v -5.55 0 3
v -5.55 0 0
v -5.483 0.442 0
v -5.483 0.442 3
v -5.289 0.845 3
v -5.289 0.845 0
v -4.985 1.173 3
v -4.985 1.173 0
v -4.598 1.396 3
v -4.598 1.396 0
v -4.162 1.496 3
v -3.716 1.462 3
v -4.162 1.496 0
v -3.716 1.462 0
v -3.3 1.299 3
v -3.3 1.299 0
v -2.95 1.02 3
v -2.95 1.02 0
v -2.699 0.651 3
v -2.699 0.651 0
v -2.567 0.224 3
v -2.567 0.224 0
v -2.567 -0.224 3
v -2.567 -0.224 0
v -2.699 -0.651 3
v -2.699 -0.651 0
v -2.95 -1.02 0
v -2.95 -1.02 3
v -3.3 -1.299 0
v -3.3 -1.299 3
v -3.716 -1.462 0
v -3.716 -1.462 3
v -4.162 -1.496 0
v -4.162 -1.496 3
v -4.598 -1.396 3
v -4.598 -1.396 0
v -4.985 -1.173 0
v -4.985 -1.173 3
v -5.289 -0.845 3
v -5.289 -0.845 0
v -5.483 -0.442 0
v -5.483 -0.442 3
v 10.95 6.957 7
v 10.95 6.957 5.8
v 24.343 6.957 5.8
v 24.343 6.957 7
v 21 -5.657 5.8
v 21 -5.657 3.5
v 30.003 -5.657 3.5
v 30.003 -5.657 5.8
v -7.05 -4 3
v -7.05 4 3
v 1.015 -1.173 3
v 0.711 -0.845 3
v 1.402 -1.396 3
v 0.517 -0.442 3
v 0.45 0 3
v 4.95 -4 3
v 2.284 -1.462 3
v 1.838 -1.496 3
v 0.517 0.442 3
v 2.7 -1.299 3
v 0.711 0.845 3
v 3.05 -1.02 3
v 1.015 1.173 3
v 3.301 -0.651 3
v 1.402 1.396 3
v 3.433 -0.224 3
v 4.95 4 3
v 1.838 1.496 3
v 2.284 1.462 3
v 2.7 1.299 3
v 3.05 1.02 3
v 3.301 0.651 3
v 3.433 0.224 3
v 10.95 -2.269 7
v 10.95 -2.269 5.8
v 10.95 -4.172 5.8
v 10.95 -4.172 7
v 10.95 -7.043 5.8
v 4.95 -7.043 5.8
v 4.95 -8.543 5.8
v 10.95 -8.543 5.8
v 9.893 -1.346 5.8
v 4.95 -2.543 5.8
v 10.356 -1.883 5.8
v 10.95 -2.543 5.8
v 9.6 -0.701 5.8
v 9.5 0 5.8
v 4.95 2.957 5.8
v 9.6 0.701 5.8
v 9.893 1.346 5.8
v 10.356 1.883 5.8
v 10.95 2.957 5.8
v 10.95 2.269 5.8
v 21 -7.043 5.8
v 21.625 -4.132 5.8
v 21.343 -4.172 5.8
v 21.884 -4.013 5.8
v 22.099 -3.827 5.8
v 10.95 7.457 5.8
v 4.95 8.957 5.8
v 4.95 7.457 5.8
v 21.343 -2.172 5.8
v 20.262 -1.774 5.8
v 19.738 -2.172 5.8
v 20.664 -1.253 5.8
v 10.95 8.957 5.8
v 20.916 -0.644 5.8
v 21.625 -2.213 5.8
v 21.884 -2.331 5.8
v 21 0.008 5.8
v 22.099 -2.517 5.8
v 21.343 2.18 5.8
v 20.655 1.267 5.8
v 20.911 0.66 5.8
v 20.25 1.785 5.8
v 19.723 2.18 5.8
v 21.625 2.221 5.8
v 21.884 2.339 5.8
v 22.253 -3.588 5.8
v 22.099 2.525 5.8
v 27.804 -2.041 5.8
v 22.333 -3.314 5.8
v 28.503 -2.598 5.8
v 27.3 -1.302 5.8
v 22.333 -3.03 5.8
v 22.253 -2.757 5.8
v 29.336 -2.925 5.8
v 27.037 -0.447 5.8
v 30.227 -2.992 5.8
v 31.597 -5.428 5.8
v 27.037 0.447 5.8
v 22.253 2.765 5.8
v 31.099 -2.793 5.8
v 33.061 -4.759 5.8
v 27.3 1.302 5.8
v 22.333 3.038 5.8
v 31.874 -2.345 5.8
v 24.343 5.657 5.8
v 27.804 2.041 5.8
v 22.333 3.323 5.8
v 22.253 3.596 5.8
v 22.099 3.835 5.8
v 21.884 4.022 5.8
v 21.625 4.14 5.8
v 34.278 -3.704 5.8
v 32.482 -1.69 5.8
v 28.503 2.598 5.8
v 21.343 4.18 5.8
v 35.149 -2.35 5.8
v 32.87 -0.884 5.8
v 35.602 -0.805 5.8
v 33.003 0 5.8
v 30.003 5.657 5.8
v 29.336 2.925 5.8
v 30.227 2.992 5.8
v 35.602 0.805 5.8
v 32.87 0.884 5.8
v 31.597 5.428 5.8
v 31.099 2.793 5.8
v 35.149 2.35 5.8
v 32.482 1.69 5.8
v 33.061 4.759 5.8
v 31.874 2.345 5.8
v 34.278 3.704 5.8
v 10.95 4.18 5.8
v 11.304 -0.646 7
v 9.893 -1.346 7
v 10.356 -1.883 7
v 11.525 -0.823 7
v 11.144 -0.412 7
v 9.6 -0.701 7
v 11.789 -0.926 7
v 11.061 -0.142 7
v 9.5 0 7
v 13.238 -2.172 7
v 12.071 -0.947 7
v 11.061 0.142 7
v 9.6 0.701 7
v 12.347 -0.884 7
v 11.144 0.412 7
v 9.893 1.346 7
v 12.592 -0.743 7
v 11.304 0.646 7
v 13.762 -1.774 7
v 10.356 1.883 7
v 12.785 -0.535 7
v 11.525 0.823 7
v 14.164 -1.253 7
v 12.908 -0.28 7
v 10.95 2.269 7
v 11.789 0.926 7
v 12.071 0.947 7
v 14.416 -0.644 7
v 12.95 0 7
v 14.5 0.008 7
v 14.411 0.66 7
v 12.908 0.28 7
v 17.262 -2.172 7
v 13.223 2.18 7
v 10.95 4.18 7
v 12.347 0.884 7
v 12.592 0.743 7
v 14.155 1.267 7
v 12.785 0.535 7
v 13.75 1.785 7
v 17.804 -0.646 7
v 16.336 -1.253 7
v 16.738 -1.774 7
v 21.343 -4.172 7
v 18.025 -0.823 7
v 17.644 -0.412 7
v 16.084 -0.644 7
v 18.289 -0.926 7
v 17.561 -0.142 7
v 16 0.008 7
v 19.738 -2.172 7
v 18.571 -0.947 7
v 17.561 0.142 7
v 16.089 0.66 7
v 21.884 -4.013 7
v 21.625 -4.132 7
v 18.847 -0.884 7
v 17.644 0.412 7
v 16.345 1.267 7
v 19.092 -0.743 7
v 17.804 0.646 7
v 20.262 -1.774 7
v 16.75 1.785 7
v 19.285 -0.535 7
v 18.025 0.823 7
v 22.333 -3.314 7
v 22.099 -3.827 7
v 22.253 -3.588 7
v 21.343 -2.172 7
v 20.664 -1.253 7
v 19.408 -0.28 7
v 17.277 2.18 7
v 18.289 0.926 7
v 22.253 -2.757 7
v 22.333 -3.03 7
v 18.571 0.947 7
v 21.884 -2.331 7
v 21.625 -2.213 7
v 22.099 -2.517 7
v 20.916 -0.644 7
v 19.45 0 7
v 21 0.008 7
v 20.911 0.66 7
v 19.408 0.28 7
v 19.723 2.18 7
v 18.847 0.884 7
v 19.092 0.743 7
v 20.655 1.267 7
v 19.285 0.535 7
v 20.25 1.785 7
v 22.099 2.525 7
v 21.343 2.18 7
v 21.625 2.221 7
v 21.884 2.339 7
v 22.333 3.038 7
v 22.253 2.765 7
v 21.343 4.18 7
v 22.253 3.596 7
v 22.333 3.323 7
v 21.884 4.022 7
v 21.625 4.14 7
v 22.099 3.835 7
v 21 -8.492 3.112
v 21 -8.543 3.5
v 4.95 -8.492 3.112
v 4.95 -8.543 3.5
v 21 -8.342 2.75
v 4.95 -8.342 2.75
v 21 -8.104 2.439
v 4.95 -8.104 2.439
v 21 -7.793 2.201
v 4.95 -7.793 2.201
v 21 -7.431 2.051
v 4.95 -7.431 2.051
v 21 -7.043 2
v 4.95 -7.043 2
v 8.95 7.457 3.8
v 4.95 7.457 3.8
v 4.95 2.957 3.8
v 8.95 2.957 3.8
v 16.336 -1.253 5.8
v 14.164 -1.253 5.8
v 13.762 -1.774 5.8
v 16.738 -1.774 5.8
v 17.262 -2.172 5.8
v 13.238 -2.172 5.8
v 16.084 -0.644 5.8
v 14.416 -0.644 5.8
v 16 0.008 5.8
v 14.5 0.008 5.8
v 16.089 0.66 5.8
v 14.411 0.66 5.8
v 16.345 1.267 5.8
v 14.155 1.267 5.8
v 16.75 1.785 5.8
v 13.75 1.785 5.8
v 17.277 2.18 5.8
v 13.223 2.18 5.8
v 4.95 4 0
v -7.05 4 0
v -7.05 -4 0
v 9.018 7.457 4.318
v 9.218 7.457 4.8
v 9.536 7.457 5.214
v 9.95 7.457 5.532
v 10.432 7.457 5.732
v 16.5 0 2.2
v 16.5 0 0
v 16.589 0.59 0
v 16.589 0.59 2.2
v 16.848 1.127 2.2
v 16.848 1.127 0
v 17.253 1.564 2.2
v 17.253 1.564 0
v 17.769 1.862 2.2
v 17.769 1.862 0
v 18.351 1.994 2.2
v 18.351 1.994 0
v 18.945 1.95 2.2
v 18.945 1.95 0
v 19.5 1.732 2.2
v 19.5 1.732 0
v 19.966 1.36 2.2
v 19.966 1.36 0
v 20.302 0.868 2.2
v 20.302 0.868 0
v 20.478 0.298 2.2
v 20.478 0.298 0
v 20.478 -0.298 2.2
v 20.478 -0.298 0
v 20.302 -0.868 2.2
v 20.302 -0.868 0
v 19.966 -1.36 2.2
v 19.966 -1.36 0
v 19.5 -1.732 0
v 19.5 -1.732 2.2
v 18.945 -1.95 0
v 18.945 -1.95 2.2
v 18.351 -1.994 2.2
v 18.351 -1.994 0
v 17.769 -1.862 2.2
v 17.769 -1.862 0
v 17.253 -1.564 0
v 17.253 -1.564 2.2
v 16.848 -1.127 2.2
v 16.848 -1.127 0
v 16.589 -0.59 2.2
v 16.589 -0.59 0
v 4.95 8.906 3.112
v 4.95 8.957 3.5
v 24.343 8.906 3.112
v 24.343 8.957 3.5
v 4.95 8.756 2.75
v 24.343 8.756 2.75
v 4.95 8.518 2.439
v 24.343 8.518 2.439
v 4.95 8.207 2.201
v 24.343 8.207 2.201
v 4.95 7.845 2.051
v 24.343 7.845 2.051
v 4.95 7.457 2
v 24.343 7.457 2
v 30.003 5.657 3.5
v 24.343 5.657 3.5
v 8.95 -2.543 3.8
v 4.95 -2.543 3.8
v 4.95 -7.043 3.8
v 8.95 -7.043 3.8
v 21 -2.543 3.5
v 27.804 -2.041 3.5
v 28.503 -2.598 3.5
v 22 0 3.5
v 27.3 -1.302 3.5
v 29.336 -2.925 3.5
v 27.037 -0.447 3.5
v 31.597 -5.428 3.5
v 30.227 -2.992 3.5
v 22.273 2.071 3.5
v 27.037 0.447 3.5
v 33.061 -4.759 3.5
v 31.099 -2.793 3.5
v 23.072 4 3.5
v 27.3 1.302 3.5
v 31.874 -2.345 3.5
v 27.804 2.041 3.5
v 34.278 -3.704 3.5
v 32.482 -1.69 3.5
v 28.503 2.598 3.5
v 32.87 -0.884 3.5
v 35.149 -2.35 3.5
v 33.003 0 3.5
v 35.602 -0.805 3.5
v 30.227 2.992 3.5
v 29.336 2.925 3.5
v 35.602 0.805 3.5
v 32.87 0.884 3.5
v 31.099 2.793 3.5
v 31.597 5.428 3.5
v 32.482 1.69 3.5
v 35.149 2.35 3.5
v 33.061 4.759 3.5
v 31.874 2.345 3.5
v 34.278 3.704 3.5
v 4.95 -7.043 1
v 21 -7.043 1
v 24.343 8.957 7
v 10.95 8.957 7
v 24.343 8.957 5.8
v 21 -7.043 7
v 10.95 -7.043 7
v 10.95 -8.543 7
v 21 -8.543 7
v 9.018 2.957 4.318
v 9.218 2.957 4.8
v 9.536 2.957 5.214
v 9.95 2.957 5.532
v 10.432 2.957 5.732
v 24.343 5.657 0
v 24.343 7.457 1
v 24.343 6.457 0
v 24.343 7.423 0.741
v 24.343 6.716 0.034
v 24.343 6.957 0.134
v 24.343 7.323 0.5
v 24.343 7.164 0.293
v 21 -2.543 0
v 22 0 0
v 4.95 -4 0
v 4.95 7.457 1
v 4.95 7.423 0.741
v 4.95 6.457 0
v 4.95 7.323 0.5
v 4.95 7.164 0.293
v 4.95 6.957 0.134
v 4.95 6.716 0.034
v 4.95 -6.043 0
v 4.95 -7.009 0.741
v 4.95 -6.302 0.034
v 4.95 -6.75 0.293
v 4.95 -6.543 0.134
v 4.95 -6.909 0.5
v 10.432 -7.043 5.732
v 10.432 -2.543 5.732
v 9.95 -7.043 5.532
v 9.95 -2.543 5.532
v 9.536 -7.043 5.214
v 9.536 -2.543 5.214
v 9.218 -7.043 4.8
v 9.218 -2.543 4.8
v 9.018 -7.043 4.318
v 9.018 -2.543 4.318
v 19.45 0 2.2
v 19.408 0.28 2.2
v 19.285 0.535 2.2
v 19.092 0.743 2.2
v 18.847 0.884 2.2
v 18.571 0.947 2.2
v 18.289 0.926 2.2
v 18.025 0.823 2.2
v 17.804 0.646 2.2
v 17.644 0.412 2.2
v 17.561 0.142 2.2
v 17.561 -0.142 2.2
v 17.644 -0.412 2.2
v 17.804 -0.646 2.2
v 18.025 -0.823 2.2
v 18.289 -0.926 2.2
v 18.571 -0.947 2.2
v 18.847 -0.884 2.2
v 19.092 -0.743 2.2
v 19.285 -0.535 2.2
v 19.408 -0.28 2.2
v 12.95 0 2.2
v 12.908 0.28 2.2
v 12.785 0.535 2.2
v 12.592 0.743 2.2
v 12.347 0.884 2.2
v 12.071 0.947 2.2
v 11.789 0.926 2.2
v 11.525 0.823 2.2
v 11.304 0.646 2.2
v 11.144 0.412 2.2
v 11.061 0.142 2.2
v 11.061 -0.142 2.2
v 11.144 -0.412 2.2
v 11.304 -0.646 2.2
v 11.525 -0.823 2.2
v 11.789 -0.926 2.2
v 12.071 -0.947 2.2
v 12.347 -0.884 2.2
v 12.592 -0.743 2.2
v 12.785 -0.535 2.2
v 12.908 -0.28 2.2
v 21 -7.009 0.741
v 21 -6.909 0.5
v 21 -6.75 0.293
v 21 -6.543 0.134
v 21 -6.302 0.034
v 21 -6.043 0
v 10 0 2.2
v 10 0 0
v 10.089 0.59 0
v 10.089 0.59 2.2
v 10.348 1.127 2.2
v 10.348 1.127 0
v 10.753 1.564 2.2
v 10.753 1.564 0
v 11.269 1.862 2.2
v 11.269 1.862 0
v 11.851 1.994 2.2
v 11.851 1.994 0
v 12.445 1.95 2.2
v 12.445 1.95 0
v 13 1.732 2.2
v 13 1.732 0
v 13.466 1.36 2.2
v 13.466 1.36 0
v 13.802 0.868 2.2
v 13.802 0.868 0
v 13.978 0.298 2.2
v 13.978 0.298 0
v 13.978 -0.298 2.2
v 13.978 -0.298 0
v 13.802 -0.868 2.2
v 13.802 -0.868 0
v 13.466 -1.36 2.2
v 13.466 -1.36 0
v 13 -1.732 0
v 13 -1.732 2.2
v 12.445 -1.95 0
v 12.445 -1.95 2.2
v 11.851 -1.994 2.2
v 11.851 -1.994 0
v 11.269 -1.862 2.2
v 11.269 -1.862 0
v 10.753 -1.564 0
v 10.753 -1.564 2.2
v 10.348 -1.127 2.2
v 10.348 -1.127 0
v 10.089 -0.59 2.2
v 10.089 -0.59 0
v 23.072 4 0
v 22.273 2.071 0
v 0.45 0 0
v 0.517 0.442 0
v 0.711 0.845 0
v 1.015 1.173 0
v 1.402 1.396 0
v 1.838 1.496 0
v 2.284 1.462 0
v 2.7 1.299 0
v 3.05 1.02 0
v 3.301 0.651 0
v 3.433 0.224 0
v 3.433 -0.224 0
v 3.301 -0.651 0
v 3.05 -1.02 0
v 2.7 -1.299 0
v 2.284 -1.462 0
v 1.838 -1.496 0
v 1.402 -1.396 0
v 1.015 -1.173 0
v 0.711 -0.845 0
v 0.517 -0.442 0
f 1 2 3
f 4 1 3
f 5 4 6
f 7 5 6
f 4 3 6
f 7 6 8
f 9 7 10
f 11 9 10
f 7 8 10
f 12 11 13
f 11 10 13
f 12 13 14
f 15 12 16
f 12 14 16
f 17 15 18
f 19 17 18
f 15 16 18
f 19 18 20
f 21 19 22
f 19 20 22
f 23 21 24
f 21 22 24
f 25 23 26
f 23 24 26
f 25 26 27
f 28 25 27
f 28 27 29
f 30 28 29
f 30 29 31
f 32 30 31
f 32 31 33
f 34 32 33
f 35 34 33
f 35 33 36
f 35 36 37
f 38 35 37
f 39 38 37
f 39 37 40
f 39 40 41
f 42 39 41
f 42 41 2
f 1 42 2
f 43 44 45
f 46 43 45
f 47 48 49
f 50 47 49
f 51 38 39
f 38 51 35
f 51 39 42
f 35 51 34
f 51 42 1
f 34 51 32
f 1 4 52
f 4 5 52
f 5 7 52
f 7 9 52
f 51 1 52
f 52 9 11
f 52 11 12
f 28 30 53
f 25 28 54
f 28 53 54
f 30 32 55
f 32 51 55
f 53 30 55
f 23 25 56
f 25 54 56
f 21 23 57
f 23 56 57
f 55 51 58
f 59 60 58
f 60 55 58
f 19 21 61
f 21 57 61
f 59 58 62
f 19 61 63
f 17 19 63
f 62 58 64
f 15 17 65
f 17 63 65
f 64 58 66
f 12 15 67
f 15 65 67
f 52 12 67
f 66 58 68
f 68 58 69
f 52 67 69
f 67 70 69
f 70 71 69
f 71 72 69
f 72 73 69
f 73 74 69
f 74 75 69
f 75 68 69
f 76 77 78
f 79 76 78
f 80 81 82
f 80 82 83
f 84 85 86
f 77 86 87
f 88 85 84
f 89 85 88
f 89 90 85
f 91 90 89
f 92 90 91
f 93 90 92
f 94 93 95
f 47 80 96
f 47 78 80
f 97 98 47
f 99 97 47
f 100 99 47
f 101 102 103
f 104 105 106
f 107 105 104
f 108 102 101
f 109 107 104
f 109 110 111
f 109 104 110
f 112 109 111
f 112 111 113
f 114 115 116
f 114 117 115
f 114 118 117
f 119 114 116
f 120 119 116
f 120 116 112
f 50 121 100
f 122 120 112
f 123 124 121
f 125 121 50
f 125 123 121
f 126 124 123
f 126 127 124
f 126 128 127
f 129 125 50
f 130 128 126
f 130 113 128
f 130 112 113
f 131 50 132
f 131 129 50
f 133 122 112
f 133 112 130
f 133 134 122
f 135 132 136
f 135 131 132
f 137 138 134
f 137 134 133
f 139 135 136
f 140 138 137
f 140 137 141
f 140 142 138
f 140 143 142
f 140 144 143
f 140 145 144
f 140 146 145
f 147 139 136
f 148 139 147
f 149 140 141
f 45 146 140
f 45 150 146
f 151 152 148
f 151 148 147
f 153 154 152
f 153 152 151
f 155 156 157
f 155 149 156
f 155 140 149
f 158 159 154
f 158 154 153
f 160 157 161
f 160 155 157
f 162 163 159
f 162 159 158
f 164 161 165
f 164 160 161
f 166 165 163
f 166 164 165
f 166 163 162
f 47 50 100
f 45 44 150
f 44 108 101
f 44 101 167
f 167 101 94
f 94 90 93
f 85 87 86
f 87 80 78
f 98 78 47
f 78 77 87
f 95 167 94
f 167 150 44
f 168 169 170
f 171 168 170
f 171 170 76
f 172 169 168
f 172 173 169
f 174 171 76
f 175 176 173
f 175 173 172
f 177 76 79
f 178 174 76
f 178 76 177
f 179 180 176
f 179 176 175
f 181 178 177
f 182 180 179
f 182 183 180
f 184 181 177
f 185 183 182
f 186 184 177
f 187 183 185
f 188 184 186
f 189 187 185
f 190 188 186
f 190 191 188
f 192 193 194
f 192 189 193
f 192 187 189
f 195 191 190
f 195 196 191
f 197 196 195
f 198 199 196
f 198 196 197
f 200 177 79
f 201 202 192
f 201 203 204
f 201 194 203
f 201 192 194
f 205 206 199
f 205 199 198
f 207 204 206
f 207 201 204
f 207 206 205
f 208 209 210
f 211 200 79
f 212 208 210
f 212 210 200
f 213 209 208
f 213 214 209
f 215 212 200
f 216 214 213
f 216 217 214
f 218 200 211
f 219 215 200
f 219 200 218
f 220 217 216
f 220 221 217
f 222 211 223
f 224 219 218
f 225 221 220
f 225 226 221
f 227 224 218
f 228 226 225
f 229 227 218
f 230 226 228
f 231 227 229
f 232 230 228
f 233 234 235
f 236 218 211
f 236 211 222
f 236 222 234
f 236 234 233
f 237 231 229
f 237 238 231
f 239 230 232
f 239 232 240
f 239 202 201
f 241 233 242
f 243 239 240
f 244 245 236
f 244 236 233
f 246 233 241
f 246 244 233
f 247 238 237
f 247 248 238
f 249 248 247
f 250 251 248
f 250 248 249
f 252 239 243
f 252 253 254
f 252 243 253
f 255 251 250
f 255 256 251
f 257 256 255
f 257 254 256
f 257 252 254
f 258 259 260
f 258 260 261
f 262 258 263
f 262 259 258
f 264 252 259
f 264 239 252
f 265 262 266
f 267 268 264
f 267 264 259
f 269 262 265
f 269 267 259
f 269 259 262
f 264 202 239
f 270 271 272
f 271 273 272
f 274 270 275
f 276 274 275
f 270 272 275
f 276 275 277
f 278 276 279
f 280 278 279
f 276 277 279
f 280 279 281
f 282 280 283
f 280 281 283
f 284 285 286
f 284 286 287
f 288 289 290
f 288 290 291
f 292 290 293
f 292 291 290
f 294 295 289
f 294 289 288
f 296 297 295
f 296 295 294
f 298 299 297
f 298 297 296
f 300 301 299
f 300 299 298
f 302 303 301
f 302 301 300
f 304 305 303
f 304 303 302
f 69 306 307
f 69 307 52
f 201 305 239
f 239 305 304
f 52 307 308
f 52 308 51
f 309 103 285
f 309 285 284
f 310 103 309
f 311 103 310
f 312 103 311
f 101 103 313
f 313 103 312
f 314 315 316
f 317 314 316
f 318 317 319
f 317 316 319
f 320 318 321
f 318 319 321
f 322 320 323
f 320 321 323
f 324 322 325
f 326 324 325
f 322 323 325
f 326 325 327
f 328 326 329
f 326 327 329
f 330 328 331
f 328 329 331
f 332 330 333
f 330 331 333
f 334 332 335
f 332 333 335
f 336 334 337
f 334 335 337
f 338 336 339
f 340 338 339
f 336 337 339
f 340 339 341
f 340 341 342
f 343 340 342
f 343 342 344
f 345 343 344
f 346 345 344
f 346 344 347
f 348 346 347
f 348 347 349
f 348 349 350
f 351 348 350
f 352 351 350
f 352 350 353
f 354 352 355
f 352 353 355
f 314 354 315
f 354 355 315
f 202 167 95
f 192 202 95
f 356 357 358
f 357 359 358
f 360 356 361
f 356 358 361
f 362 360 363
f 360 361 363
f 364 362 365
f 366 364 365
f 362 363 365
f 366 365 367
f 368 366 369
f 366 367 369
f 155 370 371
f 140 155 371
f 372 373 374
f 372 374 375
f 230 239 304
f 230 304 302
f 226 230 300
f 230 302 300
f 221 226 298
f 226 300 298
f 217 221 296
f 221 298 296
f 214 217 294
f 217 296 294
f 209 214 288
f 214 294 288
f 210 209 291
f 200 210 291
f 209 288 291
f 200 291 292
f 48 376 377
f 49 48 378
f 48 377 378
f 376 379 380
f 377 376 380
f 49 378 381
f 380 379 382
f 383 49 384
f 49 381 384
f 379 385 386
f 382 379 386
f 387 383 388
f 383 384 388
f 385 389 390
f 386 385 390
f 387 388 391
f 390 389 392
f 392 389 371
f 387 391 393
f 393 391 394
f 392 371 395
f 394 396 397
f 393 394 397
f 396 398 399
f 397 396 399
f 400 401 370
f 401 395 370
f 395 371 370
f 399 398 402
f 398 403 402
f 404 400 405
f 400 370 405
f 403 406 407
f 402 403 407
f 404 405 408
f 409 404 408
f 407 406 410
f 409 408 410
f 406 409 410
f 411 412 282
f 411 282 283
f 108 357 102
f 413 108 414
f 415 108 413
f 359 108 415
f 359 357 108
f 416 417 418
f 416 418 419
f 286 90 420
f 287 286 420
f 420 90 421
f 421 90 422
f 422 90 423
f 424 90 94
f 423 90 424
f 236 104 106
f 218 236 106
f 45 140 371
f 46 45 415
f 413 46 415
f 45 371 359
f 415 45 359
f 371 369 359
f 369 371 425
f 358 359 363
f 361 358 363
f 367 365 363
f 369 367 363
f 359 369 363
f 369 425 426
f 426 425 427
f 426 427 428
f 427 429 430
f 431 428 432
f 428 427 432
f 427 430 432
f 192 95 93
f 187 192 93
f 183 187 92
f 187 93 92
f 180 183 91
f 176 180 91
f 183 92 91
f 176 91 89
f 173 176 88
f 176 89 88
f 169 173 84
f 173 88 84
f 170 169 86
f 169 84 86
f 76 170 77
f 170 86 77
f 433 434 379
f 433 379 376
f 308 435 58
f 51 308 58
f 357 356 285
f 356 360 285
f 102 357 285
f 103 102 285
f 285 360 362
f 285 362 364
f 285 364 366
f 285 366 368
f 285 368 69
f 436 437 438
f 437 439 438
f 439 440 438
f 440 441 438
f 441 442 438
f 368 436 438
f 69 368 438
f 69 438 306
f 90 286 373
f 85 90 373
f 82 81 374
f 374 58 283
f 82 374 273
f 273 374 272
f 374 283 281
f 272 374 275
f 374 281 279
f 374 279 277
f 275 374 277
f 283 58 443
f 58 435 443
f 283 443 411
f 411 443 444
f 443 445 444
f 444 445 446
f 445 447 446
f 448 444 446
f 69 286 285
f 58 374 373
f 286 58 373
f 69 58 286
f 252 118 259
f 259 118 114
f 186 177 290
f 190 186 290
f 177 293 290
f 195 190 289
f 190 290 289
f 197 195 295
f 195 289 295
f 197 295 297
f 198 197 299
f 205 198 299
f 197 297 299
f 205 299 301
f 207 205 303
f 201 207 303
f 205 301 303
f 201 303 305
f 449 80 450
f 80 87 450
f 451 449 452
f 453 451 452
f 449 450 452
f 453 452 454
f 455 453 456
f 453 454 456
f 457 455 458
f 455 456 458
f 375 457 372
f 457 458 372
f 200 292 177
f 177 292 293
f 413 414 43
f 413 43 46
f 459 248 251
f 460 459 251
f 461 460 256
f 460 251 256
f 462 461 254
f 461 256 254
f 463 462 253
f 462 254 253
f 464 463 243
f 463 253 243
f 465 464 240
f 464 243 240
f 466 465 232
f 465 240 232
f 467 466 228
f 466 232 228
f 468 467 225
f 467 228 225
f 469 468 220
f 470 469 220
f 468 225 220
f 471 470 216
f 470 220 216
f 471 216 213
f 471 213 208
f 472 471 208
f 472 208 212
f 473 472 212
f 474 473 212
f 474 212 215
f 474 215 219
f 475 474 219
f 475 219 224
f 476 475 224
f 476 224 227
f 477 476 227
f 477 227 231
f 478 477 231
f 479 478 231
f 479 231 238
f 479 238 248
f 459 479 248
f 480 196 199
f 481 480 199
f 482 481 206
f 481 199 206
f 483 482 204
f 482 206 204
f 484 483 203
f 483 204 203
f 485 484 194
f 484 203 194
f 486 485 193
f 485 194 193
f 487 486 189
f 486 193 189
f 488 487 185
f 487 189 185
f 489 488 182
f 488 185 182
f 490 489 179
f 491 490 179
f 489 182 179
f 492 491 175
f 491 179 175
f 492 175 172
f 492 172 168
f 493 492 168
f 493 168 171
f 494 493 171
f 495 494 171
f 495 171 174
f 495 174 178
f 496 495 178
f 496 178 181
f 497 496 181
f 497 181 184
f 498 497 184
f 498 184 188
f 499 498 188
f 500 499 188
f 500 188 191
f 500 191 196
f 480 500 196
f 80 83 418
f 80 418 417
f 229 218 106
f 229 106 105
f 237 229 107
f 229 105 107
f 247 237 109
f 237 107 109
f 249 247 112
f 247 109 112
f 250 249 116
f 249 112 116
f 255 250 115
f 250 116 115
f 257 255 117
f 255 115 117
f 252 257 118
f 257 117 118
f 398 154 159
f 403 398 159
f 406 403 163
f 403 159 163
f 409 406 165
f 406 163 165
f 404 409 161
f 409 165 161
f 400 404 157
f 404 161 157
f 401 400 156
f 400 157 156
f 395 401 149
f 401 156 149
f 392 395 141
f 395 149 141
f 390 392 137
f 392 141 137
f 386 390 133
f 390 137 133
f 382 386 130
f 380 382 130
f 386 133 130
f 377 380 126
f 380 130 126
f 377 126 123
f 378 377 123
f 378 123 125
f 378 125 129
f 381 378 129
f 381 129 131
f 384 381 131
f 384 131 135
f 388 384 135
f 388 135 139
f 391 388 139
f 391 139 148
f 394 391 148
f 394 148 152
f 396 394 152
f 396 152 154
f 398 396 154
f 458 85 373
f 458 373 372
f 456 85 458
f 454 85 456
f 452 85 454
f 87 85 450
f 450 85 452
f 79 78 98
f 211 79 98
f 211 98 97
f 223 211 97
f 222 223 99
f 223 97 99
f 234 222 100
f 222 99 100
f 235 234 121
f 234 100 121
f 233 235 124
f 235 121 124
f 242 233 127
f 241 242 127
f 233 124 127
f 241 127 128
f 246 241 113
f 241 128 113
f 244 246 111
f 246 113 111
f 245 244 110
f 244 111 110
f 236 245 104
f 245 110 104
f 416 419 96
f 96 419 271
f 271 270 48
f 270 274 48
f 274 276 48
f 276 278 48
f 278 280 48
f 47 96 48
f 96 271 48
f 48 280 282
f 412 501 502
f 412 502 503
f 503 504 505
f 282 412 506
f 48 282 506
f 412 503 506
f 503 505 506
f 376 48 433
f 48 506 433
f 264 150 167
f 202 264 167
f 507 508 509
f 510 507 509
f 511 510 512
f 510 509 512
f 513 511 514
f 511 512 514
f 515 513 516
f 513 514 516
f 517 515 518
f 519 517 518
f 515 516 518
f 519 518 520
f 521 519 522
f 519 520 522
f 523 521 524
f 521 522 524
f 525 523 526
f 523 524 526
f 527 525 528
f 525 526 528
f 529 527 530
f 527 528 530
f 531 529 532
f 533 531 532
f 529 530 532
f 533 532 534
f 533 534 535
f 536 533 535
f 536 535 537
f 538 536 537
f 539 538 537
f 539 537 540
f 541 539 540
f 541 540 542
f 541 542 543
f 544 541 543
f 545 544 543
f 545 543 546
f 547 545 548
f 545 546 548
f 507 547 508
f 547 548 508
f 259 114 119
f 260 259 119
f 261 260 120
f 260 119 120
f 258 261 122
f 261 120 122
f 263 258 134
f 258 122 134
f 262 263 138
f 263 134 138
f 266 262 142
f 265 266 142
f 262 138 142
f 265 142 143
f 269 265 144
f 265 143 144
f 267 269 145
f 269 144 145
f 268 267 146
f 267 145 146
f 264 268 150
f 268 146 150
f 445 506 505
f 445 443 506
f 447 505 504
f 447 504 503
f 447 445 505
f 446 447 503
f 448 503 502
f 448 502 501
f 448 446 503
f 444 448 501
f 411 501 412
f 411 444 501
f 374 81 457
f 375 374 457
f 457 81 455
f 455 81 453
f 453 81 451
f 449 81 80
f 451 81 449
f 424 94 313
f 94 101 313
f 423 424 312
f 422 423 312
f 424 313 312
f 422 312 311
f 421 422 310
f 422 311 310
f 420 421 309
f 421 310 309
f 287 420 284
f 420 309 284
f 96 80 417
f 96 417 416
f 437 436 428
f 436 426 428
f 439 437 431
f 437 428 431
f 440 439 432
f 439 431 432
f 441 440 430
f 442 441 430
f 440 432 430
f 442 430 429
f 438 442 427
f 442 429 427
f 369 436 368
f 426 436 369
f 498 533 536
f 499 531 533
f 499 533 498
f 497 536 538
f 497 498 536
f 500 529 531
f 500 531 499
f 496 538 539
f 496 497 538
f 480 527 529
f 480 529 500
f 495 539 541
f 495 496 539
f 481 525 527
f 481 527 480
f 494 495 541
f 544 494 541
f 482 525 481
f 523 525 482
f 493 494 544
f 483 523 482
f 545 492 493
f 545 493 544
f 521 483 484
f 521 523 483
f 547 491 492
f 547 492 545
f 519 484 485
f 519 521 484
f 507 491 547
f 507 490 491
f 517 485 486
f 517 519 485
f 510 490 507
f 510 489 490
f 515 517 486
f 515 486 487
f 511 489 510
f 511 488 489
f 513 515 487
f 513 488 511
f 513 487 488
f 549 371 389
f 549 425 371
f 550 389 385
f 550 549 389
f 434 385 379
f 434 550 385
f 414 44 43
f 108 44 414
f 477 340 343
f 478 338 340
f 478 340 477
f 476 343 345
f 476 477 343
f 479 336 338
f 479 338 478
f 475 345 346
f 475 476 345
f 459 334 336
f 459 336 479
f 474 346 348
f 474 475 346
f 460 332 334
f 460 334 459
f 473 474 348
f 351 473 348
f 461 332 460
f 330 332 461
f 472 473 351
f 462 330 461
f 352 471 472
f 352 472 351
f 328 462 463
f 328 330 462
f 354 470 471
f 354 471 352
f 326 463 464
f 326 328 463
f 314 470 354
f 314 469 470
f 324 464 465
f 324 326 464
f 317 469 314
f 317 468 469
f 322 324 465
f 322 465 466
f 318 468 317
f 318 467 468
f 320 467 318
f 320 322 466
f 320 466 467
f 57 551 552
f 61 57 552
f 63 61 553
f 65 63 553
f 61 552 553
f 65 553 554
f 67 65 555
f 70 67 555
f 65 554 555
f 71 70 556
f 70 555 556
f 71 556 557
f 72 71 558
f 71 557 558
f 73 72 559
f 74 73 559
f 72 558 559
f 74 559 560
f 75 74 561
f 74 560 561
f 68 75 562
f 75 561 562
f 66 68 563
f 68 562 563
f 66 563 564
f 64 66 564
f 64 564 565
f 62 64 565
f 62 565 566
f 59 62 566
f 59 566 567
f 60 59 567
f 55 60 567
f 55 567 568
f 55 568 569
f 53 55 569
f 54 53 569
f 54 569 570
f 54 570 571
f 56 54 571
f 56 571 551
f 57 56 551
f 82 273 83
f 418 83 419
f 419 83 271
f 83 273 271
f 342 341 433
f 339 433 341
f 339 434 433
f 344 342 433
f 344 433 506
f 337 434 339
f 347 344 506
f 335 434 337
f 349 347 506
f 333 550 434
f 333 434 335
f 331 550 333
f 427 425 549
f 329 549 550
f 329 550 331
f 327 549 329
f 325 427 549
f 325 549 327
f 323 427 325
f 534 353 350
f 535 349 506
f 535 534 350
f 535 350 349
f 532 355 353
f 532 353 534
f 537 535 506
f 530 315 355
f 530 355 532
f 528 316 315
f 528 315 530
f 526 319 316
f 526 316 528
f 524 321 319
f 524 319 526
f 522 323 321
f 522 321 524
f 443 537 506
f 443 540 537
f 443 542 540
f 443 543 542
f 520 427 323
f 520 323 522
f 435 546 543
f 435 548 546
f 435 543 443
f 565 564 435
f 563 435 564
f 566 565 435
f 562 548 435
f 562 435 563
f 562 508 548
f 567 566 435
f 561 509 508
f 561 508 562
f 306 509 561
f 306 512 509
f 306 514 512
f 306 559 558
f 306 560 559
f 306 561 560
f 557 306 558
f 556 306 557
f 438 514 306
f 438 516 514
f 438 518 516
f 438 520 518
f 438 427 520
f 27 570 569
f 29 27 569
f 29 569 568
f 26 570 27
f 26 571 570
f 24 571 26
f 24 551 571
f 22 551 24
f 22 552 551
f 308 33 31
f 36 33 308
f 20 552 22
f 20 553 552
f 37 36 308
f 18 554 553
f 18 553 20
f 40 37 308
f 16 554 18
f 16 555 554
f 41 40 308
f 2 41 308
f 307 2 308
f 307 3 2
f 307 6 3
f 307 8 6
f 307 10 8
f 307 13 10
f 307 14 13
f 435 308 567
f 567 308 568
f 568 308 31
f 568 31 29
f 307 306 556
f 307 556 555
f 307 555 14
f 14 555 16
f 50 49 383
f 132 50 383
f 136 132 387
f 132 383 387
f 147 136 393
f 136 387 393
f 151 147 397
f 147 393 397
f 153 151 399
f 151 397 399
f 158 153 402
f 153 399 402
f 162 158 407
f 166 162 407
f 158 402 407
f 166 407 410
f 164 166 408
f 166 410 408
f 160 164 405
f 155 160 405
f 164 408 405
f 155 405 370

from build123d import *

# Parameters (mm, degrees)
BOSS_EXTRUDE1_DEPTH = 2
BOSS_EXTRUDE2_DEPTH = 1.5
BOSS_EXTRUDE3_DEPTH = 2.3
SKETCH6_W           = 4
SKETCH6_H           = 4.5
CUT_EXTRUDE1_DEPTH  = 2
SKETCH7_R           = 3
CUT_EXTRUDE2_DEPTH  = 3.3
SKETCH8_W           = 13.393145751
SKETCH8_H           = 2
SKETCH8_W_2         = 10.05
SKETCH8_H_2         = 1.5
BOSS_EXTRUDE4_DEPTH = 1.2
SKETCH9_R           = 2.5
BOSS_EXTRUDE5_DEPTH = 1.2
SKETCH10_R          = 0.95
CUT_EXTRUDE3_DEPTH  = 8.2
SKETCH11_R          = 2
CUT_EXTRUDE4_DEPTH  = 2.2
FILLET1_R           = 1.5
FILLET2_R           = 1
FILLET3_R           = 2
SKETCH13_W          = 3
SKETCH13_H          = 8
BOSS_EXTRUDE6_DEPTH = 12
SKETCH14_R          = 1.5
CUT_EXTRUDE5_DEPTH  = 12


with BuildPart() as part:
    # Sketch2 → Boss-Extrude1 (new body)
    with BuildSketch(Plane.XY):
        with BuildLine():
            Line((4.95, 7.456854249), (24.343145751, 7.456854249))
            Line((24.343145751, 7.456854249), (24.343145751, 5.656854249))
            ThreePointArc((24.343145751, 5.656854249), (22.60896374, 3.061467459), (22, 0))
            Line((22, 0), (21, -2.543145751))
            Line((21, -2.543145751), (21, -7.043145751))
            Line((21, -7.043145751), (8.499747468, -7.043145751))
            Line((8.499747468, -7.043145751), (4.95, -7.043145751))
            Line((4.95, -7.043145751), (4.95, 7.456854249))
        make_face()
    extrude(amount=BOSS_EXTRUDE1_DEPTH)

    # Sketch3 → Boss-Extrude2 (add)
    with BuildSketch(Plane.XY.offset(2)):
        with BuildLine():
            Line((24.343145751, 7.456854249), (24.343145751, 5.656854249))
            ThreePointArc((24.343145751, 5.656854249), (22.60896374, 3.061467459), (22, 0))
            Line((22, 0), (21, -2.543145751))
            Line((21, -2.543145751), (21, -7.043145751))
            Line((21, -7.043145751), (21, -8.543145751))
            Line((21, -8.543145751), (4.95, -8.543145751))
            Line((4.95, -8.543145751), (4.95, 8.956854249))
            Line((4.95, 8.956854249), (24.343145751, 8.956854249))
            Line((24.343145751, 8.956854249), (24.343145751, 7.456854249))
        make_face()
    extrude(amount=BOSS_EXTRUDE2_DEPTH)

    # Sketch5 → Boss-Extrude3 (add)
    with BuildSketch(Plane.XY.offset(3.5)):
        with BuildLine():
            Line((4.95, -8.543145751), (21, -8.543145751))
            Line((21, -8.543145751), (21, -5.656854249))
            Line((21, -5.656854249), (30.003145751, -5.656854249))
            ThreePointArc((30.003145751, -5.656854249), (35.66, 0), (30.003145751, 5.656854249))
            Line((30.003145751, 5.656854249), (24.343145751, 5.656854249))
            Line((24.343145751, 5.656854249), (24.343145751, 7.5))
            Line((24.343145751, 7.5), (24.343145751, 8.956854249))
            Line((24.343145751, 8.956854249), (4.95, 8.956854249))
            Line((4.95, 8.956854249), (4.95, -8.543145751))
        make_face()
    extrude(amount=BOSS_EXTRUDE3_DEPTH)

    # Sketch6 → Cut-Extrude1 (cut)
    with BuildSketch(Plane.XY.offset(5.8)):
        with Locations((6.95, 5.206854249)):
            Rectangle(SKETCH6_W, SKETCH6_H)
        with Locations((6.95, -4.793145751)):
            Rectangle(SKETCH6_W, SKETCH6_H)
    extrude(amount=-CUT_EXTRUDE1_DEPTH, mode=Mode.SUBTRACT)

    # Sketch7 → Cut-Extrude2 (cut)
    with BuildSketch(Plane.XY.offset(5.8)):
        with Locations((30.003145751, 0)):
            Circle(SKETCH7_R)
    extrude(amount=-CUT_EXTRUDE2_DEPTH, mode=Mode.SUBTRACT)

    # Sketch8 → Boss-Extrude4 (add)
    with BuildSketch(Plane.XY.offset(5.8)):
        with Locations((17.646572876, 7.956854249)):
            Rectangle(SKETCH8_W, SKETCH8_H)
        with Locations((15.975, -7.793145751)):
            Rectangle(SKETCH8_W_2, SKETCH8_H_2)
        with BuildLine():
            Line((10.95, -4.172114809), (21.343145751, -4.172114809))
            ThreePointArc((21.343145751, -4.172114809), (22.343145751, -3.172114809), (21.343145751, -2.172114809))
            Line((21.343145751, -2.172114809), (10.95, -2.172114809))
            Line((10.95, -2.172114809), (10.95, -4.172114809))
        make_face()
        with BuildLine():
            Line((21.343145751, 4.180295218), (10.95, 4.180295218))
            Line((10.95, 4.180295218), (10.95, 2.180295218))
            Line((10.95, 2.180295218), (21.343145751, 2.180295218))
            ThreePointArc((21.343145751, 2.180295218), (22.343145751, 3.180295218), (21.343145751, 4.180295218))
        make_face()
    extrude(amount=BOSS_EXTRUDE4_DEPTH)

    # Sketch9 → Boss-Extrude5 (add)
    with BuildSketch(Plane.XY.offset(5.8)):
        with Locations((18.5, 0)):
            Circle(SKETCH9_R)
        with Locations((12, 0)):
            Circle(SKETCH9_R)
    extrude(amount=BOSS_EXTRUDE5_DEPTH)

    # Sketch10 → Cut-Extrude3 (cut)
    with BuildSketch(Plane.XY.offset(7)):
        with Locations((18.5, 0)):
            Circle(SKETCH10_R)
        with Locations((12, 0)):
            Circle(SKETCH10_R)
    extrude(amount=-CUT_EXTRUDE3_DEPTH, mode=Mode.SUBTRACT)

    # Sketch11 → Cut-Extrude4 (cut)
    with BuildSketch(Plane(origin=(0, 0, 0), x_dir=(-1, 0, 0), z_dir=(0, 0, -1))):
        with Locations((-12, 0)):
            Circle(SKETCH11_R)
        with Locations((-18.5, 0)):
            Circle(SKETCH11_R)
    extrude(amount=-CUT_EXTRUDE4_DEPTH, mode=Mode.SUBTRACT)

    # Fillet1
    fillet1_edges = [part.edges().sort_by_distance(p)[0] for p in [
        (14.646572875, 8.956854249, 2),
        (12.975, -8.543145751, 2),
    ]]
    fillet(fillet1_edges, radius=FILLET1_R - 0.0001)  # a hair under: the kernel refuses the full size

    # Fillet2
    fillet2_edges = [part.edges().sort_by_distance(p)[0] for p in [
        (12.975, -7.043145751, 0),
        (14.646572875, 7.456854249, 0),
    ]]
    fillet(fillet2_edges, radius=FILLET2_R)

    # Fillet3
    fillet3_edges = [part.edges().sort_by_distance(p)[0] for p in [
        (8.95, -4.793145751, 5.8),
        (8.95, 5.206854249, 5.8),
    ]]
    fillet(fillet3_edges, radius=FILLET3_R - 0.0001)  # a hair under: the kernel refuses the full size

    # Sketch13 → Boss-Extrude6 (add)
    with BuildSketch(Plane.ZY.offset(-4.95)):
        with Locations((1.5, 0)):
            Rectangle(SKETCH13_W, SKETCH13_H)
    extrude(amount=BOSS_EXTRUDE6_DEPTH)

    # Sketch14 → Cut-Extrude5 (cut)
    with BuildSketch(Plane(origin=(0, 0, 0), x_dir=(-1, 0, 0), z_dir=(0, 0, -1))):
        with Locations((-1.95, 0)):
            Circle(SKETCH14_R)
        with Locations((4.05, 0)):
            Circle(SKETCH14_R)
    extrude(amount=-CUT_EXTRUDE5_DEPTH, mode=Mode.SUBTRACT)


solid = part.part
